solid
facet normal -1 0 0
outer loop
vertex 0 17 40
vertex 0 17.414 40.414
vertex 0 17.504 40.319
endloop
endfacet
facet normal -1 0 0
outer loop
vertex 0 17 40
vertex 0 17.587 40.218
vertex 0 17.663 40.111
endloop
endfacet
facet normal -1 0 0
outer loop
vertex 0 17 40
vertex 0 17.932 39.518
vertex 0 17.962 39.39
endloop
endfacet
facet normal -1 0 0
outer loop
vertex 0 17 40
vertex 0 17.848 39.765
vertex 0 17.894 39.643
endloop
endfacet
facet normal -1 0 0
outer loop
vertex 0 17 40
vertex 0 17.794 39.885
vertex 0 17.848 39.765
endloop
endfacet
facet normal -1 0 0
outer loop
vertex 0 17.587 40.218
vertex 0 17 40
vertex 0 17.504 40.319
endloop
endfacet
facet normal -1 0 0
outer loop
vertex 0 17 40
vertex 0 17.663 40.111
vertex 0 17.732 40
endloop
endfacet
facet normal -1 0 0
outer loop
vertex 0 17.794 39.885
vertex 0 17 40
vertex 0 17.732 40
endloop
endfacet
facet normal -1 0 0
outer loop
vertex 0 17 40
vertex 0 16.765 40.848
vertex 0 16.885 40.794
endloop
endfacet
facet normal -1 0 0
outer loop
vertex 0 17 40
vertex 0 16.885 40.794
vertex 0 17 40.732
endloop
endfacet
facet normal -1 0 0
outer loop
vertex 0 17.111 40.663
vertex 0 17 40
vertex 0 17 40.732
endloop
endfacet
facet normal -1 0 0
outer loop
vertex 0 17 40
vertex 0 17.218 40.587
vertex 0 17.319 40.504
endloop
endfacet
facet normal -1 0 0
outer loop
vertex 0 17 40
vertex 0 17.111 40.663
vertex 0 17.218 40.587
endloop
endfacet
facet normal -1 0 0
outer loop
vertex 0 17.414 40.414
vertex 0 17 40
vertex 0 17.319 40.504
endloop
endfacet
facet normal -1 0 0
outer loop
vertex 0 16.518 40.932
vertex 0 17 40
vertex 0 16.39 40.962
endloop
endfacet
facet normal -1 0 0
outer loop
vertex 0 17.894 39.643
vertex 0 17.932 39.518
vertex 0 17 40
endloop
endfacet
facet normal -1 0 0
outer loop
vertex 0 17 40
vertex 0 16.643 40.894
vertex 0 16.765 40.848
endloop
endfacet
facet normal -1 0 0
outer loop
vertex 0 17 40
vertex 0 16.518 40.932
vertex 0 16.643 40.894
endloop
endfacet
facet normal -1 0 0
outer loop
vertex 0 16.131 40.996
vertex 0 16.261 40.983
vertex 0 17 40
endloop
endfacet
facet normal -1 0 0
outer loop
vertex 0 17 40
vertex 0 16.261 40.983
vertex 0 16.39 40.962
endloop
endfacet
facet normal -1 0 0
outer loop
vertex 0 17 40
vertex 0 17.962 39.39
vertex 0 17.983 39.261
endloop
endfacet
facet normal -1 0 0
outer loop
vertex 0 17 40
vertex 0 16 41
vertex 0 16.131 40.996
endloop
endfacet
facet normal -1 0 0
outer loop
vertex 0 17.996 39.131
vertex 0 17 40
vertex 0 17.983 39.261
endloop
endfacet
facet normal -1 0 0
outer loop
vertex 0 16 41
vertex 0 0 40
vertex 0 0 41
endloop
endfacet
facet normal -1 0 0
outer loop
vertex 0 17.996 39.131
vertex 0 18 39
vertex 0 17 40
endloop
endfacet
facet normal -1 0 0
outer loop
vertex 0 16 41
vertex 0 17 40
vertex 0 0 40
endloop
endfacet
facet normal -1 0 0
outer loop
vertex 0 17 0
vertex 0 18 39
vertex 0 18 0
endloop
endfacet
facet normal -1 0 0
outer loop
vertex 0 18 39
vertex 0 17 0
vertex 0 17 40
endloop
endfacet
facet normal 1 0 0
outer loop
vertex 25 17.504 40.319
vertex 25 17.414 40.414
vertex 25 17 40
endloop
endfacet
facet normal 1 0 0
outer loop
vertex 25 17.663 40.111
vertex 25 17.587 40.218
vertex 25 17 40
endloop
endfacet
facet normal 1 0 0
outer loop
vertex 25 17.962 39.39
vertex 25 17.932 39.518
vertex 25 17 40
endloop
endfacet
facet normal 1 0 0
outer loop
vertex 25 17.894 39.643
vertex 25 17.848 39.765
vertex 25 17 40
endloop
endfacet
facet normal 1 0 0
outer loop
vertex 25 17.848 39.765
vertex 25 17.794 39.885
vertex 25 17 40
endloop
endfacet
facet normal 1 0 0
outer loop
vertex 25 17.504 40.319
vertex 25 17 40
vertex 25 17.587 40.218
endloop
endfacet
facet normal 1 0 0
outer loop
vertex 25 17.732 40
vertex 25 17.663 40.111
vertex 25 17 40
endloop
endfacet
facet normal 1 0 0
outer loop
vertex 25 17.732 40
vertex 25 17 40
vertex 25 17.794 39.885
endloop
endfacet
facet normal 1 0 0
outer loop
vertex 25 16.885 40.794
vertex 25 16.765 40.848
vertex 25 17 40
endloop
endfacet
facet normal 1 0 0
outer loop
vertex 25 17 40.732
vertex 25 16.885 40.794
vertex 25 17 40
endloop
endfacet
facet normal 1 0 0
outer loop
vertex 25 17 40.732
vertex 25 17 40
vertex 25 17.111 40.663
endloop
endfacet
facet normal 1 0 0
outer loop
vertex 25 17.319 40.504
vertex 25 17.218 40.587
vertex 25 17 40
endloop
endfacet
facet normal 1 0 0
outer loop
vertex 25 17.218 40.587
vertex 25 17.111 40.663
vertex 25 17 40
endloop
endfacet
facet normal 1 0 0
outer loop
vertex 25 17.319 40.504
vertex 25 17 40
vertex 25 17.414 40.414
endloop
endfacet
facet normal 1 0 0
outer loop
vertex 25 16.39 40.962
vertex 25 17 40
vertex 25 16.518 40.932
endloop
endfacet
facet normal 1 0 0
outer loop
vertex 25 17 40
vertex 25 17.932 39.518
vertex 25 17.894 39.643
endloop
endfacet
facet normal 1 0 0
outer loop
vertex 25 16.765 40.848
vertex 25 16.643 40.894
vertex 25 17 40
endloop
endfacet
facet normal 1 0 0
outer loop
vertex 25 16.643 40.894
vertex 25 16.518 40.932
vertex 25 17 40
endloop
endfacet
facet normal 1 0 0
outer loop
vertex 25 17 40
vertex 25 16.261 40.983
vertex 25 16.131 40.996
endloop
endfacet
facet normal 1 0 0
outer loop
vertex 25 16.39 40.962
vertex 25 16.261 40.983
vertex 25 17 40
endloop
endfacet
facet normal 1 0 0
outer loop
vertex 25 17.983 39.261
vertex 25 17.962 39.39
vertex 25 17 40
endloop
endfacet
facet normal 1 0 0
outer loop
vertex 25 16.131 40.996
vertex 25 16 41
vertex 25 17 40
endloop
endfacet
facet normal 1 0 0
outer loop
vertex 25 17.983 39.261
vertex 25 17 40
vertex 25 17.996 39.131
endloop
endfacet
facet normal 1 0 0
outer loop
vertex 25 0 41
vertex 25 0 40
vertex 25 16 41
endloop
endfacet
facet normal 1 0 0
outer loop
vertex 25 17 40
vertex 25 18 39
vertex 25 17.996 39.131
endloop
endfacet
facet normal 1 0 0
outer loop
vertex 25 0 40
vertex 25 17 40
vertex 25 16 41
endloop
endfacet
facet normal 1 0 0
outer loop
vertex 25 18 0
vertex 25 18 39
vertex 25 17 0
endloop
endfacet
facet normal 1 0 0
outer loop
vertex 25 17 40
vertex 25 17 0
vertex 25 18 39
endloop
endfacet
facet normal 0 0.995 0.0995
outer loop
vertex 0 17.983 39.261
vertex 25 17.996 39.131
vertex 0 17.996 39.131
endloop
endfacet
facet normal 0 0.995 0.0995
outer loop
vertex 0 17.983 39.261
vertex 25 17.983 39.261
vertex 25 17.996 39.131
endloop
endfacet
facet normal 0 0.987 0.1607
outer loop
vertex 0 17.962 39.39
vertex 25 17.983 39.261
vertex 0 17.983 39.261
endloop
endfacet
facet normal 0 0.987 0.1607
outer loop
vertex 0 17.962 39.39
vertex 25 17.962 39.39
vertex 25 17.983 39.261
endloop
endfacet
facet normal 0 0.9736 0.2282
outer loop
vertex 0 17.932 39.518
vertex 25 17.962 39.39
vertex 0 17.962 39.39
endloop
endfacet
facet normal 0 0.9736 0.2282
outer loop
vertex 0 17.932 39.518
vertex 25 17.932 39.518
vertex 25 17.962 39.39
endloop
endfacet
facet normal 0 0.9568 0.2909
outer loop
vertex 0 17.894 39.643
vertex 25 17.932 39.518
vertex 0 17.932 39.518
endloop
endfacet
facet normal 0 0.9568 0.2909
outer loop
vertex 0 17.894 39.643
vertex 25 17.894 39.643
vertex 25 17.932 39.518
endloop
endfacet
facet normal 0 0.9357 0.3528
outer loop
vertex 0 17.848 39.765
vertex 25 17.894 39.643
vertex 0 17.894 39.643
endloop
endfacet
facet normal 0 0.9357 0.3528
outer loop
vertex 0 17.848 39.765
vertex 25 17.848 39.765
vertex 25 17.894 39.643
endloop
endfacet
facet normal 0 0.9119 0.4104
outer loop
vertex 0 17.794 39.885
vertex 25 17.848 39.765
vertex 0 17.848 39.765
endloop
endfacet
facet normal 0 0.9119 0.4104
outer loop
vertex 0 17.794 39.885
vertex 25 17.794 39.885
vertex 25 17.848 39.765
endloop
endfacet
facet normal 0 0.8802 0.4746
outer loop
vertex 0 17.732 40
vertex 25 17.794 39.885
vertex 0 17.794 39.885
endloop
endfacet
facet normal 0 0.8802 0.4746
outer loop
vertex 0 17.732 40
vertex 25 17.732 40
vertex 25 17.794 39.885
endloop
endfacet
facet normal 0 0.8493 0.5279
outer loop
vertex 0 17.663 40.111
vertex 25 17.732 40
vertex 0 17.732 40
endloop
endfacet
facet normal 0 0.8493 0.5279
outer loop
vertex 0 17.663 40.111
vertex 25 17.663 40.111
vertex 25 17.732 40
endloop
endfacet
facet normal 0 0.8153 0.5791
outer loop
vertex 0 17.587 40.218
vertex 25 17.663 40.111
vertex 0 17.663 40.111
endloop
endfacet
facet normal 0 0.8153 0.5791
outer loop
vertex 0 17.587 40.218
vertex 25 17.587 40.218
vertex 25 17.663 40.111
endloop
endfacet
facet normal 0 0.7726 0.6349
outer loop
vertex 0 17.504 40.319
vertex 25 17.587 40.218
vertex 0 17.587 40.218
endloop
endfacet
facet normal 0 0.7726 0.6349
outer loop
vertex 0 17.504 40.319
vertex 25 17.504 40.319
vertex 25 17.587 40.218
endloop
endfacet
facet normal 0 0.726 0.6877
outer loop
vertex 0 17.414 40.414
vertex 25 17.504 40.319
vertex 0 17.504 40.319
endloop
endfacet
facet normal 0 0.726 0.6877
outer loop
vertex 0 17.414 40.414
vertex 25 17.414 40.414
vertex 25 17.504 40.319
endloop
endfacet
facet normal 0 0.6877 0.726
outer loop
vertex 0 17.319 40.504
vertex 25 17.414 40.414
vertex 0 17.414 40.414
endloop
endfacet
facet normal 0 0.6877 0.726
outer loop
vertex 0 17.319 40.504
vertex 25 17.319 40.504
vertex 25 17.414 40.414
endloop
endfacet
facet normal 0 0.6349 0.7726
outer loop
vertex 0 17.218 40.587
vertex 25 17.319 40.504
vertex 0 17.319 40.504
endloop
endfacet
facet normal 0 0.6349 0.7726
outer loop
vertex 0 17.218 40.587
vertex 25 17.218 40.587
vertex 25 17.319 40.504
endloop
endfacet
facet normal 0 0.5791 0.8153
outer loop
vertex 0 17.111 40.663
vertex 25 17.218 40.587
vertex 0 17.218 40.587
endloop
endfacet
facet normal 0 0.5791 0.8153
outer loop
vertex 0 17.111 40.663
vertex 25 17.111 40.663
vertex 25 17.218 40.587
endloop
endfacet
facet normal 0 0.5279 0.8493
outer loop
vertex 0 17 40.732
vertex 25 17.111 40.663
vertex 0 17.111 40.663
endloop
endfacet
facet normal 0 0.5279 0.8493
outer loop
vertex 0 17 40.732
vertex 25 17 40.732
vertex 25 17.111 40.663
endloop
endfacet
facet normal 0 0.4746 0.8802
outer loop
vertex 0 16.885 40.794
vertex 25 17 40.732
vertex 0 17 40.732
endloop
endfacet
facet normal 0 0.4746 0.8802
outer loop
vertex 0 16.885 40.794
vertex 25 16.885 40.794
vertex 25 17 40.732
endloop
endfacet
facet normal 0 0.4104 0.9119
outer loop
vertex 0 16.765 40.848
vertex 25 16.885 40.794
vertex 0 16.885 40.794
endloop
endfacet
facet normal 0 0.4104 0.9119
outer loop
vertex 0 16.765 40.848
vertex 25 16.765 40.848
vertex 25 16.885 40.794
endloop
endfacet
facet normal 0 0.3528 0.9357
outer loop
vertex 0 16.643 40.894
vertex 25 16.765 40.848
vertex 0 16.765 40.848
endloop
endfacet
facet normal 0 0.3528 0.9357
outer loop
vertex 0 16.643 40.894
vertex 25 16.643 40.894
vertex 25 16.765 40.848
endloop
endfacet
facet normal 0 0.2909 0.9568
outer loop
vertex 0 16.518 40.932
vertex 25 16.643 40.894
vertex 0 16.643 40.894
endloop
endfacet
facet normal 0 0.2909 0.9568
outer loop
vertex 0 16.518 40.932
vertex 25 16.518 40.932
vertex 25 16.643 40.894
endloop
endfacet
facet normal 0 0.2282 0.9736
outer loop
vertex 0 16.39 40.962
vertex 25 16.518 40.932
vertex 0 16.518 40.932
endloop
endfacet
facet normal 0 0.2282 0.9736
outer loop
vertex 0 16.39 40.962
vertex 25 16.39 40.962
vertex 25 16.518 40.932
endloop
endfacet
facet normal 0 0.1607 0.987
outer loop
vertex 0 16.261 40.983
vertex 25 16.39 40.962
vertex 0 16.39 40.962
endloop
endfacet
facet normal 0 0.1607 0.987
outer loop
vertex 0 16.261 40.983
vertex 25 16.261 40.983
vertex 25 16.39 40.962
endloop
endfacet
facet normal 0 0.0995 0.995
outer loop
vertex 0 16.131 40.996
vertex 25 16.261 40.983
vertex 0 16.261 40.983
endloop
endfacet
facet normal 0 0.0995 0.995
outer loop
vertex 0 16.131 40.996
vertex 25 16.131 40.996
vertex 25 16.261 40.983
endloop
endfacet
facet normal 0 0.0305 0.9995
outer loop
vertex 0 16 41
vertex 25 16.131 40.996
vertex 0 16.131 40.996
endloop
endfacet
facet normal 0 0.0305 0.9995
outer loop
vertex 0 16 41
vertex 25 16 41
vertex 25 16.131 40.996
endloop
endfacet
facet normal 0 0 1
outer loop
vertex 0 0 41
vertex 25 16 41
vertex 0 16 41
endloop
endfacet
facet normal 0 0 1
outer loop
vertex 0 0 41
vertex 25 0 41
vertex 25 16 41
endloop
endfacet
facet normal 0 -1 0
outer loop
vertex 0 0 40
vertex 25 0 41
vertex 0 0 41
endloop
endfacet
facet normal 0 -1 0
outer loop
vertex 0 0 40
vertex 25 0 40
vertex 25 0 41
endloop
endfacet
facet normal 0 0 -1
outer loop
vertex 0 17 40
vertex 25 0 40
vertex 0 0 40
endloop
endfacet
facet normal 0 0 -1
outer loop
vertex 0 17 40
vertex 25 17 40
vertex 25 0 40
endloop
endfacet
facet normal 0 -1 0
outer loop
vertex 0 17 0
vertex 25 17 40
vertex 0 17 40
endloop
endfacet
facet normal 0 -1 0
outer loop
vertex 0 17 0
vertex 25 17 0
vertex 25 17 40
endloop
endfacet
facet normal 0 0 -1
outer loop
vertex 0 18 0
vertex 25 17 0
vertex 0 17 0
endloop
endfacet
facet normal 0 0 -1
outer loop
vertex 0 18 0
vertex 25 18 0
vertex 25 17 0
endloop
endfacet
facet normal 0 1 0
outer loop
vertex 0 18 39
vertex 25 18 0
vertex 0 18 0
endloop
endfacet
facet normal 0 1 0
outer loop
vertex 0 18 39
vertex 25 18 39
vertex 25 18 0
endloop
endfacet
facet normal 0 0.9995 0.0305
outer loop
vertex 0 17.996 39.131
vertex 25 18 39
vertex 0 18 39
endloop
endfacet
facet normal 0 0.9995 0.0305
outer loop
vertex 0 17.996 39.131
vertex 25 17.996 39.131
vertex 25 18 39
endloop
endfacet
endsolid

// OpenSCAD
/*
    L-shaped cable channel connector 40x16

    Width: 20 mm
    Depth: 18 mm
    Height: 42 mm

    Wall thickness: 1 mm

    Outer edge: R2
    Inner edge: straight (90°)
*/

$fn = 96;

width = 25;
depth = 18;
height = 40;

wall = 1;
corner_radius = 2;

print_mode = true;


// Corner profile in the XZ plane
// X — depth
// Z — height
module side_profile() {
    r = corner_radius;

    difference() {
        union() {
            // Horizontal shelf
            translate([0, height])
                square([depth, wall]);

            // Vertical wall
            translate([depth-wall, 0])
                square([wall, height]);
        }

        // Remove material ONLY from the outside.
        // Yields a convex R2 fillet.
        translate([depth-r, height+wall-r])
            difference() {
                square([r, r]);

                circle(r = r);
            }
    }
}


// Extrude the profile to a width of 20 mm
module connector() {
    rotate([90, 0, 90])
        linear_extrude(height = width)
            side_profile();
}


// Model orientation for printing
if (print_mode) {
    connector();
} else {
    connector();
}
